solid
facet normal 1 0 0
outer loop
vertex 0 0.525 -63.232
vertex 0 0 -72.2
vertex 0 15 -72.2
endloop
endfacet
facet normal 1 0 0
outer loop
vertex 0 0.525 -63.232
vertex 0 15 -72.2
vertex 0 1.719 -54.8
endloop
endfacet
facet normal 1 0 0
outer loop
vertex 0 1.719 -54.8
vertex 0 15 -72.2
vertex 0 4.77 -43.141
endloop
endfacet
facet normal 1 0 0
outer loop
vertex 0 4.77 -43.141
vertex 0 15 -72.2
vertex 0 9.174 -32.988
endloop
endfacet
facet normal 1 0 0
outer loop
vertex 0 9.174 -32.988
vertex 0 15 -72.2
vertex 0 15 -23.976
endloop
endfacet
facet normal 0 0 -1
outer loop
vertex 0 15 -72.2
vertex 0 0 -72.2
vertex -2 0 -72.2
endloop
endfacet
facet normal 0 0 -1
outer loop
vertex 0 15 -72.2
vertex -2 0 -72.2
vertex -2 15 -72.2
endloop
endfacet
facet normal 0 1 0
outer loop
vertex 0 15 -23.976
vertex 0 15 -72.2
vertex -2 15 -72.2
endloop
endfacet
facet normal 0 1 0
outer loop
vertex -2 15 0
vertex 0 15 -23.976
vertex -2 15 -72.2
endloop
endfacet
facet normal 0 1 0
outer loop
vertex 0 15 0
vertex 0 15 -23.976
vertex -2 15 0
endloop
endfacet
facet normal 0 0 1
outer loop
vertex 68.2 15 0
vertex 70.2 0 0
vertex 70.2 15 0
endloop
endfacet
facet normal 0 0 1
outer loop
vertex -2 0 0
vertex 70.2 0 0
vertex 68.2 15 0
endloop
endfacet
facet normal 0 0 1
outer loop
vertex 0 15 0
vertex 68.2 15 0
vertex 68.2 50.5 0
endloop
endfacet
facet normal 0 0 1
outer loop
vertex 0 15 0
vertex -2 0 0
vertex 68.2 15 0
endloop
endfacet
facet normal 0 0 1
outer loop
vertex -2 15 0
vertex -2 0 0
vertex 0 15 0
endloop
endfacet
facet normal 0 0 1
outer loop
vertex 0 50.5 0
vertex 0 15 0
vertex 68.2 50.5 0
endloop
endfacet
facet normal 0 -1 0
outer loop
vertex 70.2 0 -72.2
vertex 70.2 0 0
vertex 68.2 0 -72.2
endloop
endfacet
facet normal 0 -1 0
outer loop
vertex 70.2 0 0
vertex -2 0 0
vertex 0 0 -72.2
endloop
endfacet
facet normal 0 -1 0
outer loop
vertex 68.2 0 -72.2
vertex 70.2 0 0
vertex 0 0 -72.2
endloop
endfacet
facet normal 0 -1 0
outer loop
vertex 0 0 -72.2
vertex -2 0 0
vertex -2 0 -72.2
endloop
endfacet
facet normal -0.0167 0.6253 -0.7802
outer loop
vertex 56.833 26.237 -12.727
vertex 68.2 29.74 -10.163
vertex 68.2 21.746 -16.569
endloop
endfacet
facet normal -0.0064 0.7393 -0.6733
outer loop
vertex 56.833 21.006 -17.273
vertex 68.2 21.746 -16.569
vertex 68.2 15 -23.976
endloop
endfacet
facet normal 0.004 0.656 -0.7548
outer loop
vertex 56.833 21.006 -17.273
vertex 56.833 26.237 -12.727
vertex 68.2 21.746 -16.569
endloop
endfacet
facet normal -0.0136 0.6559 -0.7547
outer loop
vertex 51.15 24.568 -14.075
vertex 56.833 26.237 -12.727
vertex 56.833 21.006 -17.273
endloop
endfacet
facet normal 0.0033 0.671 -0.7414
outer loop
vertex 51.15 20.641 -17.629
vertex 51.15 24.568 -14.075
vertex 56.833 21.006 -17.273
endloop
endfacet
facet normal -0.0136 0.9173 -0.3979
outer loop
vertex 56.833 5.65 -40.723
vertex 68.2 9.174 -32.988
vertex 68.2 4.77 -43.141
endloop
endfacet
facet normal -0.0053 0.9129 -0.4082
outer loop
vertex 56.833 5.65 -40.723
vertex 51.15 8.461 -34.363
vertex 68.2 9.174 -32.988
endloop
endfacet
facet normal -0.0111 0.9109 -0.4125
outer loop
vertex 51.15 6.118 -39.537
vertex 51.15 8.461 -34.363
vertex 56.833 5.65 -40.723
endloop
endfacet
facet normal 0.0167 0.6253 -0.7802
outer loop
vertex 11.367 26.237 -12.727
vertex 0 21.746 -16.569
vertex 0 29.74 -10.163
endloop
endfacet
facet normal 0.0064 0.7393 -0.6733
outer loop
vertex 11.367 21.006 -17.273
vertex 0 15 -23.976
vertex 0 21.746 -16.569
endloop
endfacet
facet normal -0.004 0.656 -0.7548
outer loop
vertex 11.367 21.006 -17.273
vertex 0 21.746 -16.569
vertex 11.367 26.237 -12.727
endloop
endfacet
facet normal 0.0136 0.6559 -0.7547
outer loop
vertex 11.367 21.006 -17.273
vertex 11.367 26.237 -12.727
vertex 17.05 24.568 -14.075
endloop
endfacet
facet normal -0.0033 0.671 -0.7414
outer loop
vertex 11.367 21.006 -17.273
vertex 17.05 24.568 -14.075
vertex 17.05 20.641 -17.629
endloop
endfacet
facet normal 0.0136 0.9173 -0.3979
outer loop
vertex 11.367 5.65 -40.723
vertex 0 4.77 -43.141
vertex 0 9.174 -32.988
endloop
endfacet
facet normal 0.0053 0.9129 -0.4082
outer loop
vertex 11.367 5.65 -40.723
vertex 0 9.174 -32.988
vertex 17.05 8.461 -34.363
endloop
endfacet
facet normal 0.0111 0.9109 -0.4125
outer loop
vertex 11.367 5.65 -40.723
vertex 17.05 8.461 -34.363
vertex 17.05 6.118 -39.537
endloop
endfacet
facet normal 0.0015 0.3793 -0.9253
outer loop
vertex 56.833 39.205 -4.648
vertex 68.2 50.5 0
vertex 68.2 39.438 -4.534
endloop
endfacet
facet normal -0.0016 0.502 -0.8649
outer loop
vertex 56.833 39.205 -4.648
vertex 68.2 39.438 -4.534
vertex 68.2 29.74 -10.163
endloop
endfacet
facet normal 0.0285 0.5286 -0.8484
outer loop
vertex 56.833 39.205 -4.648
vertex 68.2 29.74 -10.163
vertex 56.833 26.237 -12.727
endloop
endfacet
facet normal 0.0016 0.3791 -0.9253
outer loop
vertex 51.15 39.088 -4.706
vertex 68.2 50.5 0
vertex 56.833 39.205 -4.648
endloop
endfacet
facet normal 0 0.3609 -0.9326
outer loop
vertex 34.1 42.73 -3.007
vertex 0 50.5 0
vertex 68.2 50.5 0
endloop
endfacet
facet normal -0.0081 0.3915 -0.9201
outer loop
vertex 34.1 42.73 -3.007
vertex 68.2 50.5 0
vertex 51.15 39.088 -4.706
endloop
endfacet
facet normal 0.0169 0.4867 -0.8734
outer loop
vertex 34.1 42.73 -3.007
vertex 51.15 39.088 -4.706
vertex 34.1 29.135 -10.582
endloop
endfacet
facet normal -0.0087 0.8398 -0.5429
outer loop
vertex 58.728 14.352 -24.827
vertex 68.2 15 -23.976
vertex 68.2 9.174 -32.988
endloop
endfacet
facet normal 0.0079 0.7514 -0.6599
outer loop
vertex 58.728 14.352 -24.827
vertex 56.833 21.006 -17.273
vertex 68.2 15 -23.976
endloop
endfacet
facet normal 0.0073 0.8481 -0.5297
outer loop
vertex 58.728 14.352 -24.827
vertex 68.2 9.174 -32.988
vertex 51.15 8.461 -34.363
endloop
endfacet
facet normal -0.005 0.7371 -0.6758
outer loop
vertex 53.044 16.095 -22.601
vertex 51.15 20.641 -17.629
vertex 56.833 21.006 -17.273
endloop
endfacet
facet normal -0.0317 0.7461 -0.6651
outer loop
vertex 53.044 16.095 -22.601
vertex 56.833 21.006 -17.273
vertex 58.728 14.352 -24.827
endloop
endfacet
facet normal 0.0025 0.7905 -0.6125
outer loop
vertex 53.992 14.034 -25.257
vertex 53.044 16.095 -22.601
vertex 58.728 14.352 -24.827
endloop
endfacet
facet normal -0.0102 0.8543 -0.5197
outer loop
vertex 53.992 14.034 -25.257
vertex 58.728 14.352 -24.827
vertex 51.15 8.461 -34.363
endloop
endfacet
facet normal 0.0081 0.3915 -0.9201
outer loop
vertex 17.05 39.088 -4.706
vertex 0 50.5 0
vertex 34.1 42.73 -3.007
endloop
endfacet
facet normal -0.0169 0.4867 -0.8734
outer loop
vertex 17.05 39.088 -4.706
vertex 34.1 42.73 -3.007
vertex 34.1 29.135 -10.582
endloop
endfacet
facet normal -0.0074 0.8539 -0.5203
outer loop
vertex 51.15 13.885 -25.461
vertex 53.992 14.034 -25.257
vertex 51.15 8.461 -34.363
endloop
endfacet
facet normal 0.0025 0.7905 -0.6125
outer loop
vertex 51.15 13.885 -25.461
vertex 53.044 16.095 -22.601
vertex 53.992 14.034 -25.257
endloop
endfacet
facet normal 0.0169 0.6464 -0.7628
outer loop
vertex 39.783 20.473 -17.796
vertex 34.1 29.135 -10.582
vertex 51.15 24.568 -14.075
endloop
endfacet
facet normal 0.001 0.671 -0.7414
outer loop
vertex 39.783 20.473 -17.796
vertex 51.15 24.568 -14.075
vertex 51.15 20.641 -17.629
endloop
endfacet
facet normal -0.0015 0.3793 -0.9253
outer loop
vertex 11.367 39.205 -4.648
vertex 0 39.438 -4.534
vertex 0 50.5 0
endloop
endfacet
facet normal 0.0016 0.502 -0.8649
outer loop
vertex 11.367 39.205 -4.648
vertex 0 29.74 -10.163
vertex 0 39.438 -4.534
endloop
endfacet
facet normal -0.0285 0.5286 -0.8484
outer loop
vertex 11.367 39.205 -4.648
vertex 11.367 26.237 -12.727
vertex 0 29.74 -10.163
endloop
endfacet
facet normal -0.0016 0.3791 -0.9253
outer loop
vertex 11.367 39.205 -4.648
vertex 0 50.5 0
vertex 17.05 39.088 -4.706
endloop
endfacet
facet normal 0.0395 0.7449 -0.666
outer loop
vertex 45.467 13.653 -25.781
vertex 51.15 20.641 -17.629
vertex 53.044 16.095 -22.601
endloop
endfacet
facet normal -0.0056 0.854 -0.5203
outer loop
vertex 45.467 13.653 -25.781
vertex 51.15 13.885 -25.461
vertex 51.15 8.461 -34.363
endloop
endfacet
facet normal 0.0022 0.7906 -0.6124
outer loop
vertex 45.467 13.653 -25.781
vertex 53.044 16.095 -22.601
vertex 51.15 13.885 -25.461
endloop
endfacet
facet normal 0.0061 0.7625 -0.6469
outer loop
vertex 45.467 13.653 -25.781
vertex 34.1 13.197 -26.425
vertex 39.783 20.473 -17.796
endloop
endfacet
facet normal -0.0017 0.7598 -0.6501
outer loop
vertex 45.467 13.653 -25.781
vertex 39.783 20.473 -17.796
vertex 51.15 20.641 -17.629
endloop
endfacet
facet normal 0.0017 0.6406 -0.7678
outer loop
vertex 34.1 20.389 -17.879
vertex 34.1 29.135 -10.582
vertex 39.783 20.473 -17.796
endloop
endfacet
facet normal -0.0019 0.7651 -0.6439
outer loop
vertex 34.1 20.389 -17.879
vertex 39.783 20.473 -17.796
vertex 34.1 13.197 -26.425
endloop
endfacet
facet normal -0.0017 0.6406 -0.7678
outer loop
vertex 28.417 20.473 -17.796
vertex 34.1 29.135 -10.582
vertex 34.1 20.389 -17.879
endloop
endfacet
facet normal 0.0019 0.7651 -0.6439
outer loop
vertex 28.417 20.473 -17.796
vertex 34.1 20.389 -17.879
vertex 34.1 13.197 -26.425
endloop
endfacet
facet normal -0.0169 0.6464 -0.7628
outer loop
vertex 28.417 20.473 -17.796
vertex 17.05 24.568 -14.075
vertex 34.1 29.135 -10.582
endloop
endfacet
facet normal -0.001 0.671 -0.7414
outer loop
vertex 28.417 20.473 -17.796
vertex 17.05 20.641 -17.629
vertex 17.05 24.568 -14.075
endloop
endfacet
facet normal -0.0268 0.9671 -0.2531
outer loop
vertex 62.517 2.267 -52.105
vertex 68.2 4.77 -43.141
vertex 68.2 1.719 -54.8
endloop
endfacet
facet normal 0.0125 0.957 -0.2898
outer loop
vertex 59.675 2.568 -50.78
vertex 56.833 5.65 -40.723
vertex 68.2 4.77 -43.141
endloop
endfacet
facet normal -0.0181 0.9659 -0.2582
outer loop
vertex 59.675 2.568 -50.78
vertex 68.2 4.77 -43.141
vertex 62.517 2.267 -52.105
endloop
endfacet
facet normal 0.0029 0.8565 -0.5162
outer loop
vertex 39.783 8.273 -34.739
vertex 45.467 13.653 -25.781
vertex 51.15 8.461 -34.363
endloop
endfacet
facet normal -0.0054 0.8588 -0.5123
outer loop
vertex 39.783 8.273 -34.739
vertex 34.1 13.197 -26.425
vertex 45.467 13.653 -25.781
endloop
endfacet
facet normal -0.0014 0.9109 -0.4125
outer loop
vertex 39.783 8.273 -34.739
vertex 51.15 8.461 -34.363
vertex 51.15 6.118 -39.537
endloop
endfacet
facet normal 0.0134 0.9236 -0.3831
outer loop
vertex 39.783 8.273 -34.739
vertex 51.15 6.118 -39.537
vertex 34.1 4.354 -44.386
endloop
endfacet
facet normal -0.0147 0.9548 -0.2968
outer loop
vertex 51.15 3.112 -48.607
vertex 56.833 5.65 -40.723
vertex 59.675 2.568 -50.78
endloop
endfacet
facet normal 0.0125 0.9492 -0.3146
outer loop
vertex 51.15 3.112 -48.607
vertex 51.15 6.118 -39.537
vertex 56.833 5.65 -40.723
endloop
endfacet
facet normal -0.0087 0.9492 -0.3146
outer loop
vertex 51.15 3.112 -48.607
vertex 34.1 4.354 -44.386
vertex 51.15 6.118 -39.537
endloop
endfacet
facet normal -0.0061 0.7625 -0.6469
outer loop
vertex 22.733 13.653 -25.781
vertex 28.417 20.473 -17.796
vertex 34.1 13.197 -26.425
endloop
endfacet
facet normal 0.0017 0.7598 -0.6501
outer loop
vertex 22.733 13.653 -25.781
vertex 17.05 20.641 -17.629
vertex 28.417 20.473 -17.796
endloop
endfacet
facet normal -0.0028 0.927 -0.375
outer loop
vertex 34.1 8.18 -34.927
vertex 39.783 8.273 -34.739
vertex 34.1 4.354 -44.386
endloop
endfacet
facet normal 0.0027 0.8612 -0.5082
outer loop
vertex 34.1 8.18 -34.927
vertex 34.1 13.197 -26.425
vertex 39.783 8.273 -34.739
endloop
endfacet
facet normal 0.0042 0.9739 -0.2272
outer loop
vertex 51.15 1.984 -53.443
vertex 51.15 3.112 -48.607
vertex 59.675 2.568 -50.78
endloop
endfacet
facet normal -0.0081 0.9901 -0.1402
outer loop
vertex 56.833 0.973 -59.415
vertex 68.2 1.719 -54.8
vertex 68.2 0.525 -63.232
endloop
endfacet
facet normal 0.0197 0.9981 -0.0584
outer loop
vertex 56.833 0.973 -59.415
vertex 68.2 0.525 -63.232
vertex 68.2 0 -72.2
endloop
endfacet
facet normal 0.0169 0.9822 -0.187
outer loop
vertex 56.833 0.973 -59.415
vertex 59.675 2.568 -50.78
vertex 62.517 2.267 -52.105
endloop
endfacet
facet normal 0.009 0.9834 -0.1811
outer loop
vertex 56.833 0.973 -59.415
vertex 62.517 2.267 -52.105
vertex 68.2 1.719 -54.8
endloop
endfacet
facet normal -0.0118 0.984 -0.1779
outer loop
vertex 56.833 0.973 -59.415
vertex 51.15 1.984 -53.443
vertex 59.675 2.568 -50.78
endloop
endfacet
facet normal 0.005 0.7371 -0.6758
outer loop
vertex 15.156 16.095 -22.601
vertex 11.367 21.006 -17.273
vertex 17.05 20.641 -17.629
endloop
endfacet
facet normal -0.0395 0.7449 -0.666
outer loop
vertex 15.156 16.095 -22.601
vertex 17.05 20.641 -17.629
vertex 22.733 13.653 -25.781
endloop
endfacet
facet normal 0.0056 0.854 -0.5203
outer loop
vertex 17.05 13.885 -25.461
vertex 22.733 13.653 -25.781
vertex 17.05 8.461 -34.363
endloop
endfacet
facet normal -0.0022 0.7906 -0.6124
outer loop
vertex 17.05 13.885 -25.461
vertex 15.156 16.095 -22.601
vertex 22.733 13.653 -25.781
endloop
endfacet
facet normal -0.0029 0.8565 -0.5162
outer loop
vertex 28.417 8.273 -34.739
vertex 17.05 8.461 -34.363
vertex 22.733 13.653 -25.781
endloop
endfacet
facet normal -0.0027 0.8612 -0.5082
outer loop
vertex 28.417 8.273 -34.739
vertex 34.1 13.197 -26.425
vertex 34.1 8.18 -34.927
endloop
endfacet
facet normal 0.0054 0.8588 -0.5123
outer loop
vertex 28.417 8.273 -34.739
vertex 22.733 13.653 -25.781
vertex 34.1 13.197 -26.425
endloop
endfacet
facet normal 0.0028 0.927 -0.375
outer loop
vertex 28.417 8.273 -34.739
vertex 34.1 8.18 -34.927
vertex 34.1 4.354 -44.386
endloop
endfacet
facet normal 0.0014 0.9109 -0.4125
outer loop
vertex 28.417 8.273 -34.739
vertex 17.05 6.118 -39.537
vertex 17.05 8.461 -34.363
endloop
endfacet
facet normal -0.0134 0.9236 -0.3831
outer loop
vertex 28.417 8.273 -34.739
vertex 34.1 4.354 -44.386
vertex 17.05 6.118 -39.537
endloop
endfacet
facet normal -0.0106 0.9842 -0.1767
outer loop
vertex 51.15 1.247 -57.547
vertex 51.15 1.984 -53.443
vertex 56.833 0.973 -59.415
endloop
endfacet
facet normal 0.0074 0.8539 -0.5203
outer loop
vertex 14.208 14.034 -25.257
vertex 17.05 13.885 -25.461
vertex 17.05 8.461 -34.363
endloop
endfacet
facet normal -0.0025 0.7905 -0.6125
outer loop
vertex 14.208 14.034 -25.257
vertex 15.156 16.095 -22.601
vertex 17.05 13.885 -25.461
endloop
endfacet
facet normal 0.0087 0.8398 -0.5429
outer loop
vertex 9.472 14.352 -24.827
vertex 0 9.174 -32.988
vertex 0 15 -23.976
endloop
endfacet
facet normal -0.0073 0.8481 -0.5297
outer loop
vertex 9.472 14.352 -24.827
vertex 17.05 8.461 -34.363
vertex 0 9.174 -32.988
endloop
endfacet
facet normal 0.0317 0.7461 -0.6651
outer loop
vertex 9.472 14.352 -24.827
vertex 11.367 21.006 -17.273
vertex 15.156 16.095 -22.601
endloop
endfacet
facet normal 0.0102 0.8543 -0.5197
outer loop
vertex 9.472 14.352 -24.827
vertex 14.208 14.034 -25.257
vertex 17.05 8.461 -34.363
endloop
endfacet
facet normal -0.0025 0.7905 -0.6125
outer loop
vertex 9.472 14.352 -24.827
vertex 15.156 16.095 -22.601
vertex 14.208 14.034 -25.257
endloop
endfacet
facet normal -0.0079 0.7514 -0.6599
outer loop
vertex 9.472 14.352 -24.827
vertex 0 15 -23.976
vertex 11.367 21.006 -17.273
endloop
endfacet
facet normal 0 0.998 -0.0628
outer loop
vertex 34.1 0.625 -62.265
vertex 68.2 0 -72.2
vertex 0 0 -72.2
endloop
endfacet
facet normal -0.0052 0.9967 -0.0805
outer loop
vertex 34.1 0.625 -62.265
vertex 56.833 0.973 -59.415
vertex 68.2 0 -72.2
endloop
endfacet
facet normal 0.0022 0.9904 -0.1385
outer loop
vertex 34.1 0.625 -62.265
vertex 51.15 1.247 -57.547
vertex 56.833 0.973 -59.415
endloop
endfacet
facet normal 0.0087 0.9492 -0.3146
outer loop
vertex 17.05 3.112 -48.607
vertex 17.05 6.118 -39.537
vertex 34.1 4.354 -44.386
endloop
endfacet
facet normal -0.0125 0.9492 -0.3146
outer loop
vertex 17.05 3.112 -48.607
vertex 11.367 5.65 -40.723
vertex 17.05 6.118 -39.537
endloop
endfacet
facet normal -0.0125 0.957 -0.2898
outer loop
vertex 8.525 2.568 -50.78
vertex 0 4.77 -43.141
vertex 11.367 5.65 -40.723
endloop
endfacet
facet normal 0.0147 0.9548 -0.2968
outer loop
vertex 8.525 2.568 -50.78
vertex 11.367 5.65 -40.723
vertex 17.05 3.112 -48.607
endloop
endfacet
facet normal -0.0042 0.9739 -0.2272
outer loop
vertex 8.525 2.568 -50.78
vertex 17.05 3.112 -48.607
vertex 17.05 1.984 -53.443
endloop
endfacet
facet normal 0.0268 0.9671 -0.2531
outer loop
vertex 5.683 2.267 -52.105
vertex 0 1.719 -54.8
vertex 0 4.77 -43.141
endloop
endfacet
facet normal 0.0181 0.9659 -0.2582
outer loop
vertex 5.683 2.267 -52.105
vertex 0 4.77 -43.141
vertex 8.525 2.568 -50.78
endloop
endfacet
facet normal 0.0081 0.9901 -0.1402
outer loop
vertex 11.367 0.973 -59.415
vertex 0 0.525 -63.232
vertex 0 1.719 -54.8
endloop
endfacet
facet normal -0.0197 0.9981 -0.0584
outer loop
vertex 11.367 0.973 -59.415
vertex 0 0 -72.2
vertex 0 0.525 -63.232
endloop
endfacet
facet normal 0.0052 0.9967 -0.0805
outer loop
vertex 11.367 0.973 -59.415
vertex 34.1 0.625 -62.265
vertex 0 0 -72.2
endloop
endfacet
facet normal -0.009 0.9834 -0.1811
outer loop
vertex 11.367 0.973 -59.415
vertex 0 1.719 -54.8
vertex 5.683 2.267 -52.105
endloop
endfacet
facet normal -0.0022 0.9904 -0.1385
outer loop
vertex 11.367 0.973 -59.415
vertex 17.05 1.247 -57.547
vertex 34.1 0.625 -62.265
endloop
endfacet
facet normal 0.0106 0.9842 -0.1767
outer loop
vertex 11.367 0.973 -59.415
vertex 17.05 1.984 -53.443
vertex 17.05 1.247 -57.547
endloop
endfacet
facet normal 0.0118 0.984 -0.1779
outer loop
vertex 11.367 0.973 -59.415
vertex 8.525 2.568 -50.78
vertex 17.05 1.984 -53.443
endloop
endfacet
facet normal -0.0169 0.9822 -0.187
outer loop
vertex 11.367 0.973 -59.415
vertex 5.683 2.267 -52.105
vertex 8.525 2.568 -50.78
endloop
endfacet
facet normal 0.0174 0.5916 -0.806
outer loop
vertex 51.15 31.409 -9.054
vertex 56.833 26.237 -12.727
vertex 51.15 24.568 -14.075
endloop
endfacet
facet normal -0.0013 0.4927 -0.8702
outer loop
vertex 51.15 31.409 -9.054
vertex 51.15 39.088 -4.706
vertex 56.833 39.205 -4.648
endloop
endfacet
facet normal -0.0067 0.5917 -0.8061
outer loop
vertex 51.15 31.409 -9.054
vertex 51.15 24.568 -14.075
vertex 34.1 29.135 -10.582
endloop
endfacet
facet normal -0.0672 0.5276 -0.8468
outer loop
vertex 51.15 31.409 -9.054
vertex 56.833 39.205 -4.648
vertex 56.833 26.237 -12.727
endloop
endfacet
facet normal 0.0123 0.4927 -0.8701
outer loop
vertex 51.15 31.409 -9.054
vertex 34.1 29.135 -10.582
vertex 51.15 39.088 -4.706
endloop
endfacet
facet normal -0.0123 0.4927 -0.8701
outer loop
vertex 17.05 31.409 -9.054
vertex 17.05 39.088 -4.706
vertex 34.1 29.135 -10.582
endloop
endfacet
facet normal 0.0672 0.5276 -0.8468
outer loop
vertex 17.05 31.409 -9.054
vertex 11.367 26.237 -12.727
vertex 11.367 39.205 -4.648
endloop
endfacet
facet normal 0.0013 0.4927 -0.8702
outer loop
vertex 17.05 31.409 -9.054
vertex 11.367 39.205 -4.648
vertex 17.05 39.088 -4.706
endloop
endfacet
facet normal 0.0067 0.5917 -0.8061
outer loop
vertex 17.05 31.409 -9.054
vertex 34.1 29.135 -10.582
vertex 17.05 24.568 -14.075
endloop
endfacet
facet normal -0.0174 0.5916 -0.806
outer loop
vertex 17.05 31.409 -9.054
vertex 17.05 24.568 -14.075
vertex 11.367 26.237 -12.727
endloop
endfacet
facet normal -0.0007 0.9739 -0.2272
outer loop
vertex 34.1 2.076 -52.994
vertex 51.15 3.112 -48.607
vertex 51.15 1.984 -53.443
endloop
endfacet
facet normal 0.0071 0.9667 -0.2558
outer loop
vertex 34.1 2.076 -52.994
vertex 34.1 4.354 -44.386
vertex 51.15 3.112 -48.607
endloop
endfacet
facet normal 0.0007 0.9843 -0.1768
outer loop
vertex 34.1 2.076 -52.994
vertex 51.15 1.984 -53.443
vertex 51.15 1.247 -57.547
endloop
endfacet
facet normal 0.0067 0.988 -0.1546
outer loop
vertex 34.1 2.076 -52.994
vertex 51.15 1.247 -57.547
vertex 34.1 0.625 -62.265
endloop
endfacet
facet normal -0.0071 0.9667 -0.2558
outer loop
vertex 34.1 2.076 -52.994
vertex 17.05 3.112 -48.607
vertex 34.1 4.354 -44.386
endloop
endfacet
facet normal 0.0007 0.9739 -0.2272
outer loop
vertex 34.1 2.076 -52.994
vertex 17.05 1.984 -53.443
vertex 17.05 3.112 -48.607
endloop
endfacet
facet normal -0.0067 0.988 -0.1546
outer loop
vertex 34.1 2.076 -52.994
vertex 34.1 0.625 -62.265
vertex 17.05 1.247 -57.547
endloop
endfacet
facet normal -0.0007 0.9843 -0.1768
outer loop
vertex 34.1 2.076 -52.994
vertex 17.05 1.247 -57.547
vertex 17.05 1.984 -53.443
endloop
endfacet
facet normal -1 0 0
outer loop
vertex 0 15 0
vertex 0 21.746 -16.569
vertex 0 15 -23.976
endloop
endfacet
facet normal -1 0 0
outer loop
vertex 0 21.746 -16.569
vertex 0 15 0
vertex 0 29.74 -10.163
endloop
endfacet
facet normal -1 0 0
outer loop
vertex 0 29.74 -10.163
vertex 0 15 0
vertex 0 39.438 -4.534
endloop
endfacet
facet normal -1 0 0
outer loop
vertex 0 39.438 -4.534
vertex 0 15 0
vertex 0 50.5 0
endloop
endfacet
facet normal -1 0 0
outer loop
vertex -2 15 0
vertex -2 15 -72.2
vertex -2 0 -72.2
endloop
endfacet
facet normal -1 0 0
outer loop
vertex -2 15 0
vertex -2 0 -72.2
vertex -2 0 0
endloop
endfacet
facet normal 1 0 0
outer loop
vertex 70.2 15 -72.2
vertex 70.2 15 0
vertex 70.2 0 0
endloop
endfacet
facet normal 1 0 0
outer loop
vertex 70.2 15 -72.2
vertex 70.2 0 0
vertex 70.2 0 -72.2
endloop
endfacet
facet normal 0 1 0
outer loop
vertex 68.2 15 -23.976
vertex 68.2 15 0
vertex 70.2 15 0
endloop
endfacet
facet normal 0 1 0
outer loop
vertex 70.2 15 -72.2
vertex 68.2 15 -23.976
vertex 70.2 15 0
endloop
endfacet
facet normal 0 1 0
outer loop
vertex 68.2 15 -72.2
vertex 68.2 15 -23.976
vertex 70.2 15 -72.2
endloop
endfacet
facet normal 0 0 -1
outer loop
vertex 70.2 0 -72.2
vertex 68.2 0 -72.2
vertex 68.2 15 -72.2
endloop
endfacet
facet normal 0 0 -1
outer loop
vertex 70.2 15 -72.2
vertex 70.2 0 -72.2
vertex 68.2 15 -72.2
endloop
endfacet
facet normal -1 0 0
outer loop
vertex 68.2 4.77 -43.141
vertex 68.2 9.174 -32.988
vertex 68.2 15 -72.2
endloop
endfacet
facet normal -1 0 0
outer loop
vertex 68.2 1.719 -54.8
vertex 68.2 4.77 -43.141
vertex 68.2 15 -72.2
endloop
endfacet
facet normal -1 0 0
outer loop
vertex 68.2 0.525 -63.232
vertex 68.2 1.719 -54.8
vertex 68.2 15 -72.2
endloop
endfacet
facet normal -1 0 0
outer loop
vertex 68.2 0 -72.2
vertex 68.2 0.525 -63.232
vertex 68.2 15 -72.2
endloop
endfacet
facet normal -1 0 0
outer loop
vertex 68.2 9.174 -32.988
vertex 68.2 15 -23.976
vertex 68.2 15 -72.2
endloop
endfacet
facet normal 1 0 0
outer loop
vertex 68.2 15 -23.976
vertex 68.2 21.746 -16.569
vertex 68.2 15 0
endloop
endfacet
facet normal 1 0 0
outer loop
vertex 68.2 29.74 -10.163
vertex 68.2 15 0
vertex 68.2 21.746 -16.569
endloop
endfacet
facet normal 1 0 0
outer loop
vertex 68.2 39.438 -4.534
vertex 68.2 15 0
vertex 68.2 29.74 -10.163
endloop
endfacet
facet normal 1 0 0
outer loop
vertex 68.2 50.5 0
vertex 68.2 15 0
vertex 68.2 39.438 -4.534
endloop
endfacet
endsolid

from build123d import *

# Parameters (mm, degrees)
BOSS_EXTRUDE1_DEPTH = 68.2
SKETCH2_W           = 72.2
SKETCH2_H           = 15
BOSS_EXTRUDE2_DEPTH = 2
SKETCH3_W           = 72.2
SKETCH3_H           = 15
BOSS_EXTRUDE3_DEPTH = 2


with BuildPart() as part:
    # Sketch1 → Boss-Extrude1 (new body)
    with BuildSketch(Plane(origin=(0, 0, 0), x_dir=(0, 0, -1), z_dir=(1, 0, 0))):
        with BuildLine():
            Line((0, 0), (72.2, 0))
            add(Edge.make_bspline(
                [(0, 50.5), (16.749312519, 1.14415236), (72.2, 0)],
                knots=[0, 0, 0, 1, 1, 1], degree=2))
            Line((0, 50.5), (0, 0))
        make_face()
    extrude(amount=BOSS_EXTRUDE1_DEPTH)

    # Sketch2 → Boss-Extrude2 (add)
    with BuildSketch(Plane.ZY):
        with Locations((-36.1, 7.5)):
            Rectangle(SKETCH2_W, SKETCH2_H)
    extrude(amount=BOSS_EXTRUDE2_DEPTH)

    # Sketch3 → Boss-Extrude3 (add)
    with BuildSketch(Plane(origin=(68.2, 0, 0), x_dir=(0, 0, -1), z_dir=(1, 0, 0))):
        with Locations((36.1, 7.5)):
            Rectangle(SKETCH3_W, SKETCH3_H)
    extrude(amount=BOSS_EXTRUDE3_DEPTH)


solid = part.part
